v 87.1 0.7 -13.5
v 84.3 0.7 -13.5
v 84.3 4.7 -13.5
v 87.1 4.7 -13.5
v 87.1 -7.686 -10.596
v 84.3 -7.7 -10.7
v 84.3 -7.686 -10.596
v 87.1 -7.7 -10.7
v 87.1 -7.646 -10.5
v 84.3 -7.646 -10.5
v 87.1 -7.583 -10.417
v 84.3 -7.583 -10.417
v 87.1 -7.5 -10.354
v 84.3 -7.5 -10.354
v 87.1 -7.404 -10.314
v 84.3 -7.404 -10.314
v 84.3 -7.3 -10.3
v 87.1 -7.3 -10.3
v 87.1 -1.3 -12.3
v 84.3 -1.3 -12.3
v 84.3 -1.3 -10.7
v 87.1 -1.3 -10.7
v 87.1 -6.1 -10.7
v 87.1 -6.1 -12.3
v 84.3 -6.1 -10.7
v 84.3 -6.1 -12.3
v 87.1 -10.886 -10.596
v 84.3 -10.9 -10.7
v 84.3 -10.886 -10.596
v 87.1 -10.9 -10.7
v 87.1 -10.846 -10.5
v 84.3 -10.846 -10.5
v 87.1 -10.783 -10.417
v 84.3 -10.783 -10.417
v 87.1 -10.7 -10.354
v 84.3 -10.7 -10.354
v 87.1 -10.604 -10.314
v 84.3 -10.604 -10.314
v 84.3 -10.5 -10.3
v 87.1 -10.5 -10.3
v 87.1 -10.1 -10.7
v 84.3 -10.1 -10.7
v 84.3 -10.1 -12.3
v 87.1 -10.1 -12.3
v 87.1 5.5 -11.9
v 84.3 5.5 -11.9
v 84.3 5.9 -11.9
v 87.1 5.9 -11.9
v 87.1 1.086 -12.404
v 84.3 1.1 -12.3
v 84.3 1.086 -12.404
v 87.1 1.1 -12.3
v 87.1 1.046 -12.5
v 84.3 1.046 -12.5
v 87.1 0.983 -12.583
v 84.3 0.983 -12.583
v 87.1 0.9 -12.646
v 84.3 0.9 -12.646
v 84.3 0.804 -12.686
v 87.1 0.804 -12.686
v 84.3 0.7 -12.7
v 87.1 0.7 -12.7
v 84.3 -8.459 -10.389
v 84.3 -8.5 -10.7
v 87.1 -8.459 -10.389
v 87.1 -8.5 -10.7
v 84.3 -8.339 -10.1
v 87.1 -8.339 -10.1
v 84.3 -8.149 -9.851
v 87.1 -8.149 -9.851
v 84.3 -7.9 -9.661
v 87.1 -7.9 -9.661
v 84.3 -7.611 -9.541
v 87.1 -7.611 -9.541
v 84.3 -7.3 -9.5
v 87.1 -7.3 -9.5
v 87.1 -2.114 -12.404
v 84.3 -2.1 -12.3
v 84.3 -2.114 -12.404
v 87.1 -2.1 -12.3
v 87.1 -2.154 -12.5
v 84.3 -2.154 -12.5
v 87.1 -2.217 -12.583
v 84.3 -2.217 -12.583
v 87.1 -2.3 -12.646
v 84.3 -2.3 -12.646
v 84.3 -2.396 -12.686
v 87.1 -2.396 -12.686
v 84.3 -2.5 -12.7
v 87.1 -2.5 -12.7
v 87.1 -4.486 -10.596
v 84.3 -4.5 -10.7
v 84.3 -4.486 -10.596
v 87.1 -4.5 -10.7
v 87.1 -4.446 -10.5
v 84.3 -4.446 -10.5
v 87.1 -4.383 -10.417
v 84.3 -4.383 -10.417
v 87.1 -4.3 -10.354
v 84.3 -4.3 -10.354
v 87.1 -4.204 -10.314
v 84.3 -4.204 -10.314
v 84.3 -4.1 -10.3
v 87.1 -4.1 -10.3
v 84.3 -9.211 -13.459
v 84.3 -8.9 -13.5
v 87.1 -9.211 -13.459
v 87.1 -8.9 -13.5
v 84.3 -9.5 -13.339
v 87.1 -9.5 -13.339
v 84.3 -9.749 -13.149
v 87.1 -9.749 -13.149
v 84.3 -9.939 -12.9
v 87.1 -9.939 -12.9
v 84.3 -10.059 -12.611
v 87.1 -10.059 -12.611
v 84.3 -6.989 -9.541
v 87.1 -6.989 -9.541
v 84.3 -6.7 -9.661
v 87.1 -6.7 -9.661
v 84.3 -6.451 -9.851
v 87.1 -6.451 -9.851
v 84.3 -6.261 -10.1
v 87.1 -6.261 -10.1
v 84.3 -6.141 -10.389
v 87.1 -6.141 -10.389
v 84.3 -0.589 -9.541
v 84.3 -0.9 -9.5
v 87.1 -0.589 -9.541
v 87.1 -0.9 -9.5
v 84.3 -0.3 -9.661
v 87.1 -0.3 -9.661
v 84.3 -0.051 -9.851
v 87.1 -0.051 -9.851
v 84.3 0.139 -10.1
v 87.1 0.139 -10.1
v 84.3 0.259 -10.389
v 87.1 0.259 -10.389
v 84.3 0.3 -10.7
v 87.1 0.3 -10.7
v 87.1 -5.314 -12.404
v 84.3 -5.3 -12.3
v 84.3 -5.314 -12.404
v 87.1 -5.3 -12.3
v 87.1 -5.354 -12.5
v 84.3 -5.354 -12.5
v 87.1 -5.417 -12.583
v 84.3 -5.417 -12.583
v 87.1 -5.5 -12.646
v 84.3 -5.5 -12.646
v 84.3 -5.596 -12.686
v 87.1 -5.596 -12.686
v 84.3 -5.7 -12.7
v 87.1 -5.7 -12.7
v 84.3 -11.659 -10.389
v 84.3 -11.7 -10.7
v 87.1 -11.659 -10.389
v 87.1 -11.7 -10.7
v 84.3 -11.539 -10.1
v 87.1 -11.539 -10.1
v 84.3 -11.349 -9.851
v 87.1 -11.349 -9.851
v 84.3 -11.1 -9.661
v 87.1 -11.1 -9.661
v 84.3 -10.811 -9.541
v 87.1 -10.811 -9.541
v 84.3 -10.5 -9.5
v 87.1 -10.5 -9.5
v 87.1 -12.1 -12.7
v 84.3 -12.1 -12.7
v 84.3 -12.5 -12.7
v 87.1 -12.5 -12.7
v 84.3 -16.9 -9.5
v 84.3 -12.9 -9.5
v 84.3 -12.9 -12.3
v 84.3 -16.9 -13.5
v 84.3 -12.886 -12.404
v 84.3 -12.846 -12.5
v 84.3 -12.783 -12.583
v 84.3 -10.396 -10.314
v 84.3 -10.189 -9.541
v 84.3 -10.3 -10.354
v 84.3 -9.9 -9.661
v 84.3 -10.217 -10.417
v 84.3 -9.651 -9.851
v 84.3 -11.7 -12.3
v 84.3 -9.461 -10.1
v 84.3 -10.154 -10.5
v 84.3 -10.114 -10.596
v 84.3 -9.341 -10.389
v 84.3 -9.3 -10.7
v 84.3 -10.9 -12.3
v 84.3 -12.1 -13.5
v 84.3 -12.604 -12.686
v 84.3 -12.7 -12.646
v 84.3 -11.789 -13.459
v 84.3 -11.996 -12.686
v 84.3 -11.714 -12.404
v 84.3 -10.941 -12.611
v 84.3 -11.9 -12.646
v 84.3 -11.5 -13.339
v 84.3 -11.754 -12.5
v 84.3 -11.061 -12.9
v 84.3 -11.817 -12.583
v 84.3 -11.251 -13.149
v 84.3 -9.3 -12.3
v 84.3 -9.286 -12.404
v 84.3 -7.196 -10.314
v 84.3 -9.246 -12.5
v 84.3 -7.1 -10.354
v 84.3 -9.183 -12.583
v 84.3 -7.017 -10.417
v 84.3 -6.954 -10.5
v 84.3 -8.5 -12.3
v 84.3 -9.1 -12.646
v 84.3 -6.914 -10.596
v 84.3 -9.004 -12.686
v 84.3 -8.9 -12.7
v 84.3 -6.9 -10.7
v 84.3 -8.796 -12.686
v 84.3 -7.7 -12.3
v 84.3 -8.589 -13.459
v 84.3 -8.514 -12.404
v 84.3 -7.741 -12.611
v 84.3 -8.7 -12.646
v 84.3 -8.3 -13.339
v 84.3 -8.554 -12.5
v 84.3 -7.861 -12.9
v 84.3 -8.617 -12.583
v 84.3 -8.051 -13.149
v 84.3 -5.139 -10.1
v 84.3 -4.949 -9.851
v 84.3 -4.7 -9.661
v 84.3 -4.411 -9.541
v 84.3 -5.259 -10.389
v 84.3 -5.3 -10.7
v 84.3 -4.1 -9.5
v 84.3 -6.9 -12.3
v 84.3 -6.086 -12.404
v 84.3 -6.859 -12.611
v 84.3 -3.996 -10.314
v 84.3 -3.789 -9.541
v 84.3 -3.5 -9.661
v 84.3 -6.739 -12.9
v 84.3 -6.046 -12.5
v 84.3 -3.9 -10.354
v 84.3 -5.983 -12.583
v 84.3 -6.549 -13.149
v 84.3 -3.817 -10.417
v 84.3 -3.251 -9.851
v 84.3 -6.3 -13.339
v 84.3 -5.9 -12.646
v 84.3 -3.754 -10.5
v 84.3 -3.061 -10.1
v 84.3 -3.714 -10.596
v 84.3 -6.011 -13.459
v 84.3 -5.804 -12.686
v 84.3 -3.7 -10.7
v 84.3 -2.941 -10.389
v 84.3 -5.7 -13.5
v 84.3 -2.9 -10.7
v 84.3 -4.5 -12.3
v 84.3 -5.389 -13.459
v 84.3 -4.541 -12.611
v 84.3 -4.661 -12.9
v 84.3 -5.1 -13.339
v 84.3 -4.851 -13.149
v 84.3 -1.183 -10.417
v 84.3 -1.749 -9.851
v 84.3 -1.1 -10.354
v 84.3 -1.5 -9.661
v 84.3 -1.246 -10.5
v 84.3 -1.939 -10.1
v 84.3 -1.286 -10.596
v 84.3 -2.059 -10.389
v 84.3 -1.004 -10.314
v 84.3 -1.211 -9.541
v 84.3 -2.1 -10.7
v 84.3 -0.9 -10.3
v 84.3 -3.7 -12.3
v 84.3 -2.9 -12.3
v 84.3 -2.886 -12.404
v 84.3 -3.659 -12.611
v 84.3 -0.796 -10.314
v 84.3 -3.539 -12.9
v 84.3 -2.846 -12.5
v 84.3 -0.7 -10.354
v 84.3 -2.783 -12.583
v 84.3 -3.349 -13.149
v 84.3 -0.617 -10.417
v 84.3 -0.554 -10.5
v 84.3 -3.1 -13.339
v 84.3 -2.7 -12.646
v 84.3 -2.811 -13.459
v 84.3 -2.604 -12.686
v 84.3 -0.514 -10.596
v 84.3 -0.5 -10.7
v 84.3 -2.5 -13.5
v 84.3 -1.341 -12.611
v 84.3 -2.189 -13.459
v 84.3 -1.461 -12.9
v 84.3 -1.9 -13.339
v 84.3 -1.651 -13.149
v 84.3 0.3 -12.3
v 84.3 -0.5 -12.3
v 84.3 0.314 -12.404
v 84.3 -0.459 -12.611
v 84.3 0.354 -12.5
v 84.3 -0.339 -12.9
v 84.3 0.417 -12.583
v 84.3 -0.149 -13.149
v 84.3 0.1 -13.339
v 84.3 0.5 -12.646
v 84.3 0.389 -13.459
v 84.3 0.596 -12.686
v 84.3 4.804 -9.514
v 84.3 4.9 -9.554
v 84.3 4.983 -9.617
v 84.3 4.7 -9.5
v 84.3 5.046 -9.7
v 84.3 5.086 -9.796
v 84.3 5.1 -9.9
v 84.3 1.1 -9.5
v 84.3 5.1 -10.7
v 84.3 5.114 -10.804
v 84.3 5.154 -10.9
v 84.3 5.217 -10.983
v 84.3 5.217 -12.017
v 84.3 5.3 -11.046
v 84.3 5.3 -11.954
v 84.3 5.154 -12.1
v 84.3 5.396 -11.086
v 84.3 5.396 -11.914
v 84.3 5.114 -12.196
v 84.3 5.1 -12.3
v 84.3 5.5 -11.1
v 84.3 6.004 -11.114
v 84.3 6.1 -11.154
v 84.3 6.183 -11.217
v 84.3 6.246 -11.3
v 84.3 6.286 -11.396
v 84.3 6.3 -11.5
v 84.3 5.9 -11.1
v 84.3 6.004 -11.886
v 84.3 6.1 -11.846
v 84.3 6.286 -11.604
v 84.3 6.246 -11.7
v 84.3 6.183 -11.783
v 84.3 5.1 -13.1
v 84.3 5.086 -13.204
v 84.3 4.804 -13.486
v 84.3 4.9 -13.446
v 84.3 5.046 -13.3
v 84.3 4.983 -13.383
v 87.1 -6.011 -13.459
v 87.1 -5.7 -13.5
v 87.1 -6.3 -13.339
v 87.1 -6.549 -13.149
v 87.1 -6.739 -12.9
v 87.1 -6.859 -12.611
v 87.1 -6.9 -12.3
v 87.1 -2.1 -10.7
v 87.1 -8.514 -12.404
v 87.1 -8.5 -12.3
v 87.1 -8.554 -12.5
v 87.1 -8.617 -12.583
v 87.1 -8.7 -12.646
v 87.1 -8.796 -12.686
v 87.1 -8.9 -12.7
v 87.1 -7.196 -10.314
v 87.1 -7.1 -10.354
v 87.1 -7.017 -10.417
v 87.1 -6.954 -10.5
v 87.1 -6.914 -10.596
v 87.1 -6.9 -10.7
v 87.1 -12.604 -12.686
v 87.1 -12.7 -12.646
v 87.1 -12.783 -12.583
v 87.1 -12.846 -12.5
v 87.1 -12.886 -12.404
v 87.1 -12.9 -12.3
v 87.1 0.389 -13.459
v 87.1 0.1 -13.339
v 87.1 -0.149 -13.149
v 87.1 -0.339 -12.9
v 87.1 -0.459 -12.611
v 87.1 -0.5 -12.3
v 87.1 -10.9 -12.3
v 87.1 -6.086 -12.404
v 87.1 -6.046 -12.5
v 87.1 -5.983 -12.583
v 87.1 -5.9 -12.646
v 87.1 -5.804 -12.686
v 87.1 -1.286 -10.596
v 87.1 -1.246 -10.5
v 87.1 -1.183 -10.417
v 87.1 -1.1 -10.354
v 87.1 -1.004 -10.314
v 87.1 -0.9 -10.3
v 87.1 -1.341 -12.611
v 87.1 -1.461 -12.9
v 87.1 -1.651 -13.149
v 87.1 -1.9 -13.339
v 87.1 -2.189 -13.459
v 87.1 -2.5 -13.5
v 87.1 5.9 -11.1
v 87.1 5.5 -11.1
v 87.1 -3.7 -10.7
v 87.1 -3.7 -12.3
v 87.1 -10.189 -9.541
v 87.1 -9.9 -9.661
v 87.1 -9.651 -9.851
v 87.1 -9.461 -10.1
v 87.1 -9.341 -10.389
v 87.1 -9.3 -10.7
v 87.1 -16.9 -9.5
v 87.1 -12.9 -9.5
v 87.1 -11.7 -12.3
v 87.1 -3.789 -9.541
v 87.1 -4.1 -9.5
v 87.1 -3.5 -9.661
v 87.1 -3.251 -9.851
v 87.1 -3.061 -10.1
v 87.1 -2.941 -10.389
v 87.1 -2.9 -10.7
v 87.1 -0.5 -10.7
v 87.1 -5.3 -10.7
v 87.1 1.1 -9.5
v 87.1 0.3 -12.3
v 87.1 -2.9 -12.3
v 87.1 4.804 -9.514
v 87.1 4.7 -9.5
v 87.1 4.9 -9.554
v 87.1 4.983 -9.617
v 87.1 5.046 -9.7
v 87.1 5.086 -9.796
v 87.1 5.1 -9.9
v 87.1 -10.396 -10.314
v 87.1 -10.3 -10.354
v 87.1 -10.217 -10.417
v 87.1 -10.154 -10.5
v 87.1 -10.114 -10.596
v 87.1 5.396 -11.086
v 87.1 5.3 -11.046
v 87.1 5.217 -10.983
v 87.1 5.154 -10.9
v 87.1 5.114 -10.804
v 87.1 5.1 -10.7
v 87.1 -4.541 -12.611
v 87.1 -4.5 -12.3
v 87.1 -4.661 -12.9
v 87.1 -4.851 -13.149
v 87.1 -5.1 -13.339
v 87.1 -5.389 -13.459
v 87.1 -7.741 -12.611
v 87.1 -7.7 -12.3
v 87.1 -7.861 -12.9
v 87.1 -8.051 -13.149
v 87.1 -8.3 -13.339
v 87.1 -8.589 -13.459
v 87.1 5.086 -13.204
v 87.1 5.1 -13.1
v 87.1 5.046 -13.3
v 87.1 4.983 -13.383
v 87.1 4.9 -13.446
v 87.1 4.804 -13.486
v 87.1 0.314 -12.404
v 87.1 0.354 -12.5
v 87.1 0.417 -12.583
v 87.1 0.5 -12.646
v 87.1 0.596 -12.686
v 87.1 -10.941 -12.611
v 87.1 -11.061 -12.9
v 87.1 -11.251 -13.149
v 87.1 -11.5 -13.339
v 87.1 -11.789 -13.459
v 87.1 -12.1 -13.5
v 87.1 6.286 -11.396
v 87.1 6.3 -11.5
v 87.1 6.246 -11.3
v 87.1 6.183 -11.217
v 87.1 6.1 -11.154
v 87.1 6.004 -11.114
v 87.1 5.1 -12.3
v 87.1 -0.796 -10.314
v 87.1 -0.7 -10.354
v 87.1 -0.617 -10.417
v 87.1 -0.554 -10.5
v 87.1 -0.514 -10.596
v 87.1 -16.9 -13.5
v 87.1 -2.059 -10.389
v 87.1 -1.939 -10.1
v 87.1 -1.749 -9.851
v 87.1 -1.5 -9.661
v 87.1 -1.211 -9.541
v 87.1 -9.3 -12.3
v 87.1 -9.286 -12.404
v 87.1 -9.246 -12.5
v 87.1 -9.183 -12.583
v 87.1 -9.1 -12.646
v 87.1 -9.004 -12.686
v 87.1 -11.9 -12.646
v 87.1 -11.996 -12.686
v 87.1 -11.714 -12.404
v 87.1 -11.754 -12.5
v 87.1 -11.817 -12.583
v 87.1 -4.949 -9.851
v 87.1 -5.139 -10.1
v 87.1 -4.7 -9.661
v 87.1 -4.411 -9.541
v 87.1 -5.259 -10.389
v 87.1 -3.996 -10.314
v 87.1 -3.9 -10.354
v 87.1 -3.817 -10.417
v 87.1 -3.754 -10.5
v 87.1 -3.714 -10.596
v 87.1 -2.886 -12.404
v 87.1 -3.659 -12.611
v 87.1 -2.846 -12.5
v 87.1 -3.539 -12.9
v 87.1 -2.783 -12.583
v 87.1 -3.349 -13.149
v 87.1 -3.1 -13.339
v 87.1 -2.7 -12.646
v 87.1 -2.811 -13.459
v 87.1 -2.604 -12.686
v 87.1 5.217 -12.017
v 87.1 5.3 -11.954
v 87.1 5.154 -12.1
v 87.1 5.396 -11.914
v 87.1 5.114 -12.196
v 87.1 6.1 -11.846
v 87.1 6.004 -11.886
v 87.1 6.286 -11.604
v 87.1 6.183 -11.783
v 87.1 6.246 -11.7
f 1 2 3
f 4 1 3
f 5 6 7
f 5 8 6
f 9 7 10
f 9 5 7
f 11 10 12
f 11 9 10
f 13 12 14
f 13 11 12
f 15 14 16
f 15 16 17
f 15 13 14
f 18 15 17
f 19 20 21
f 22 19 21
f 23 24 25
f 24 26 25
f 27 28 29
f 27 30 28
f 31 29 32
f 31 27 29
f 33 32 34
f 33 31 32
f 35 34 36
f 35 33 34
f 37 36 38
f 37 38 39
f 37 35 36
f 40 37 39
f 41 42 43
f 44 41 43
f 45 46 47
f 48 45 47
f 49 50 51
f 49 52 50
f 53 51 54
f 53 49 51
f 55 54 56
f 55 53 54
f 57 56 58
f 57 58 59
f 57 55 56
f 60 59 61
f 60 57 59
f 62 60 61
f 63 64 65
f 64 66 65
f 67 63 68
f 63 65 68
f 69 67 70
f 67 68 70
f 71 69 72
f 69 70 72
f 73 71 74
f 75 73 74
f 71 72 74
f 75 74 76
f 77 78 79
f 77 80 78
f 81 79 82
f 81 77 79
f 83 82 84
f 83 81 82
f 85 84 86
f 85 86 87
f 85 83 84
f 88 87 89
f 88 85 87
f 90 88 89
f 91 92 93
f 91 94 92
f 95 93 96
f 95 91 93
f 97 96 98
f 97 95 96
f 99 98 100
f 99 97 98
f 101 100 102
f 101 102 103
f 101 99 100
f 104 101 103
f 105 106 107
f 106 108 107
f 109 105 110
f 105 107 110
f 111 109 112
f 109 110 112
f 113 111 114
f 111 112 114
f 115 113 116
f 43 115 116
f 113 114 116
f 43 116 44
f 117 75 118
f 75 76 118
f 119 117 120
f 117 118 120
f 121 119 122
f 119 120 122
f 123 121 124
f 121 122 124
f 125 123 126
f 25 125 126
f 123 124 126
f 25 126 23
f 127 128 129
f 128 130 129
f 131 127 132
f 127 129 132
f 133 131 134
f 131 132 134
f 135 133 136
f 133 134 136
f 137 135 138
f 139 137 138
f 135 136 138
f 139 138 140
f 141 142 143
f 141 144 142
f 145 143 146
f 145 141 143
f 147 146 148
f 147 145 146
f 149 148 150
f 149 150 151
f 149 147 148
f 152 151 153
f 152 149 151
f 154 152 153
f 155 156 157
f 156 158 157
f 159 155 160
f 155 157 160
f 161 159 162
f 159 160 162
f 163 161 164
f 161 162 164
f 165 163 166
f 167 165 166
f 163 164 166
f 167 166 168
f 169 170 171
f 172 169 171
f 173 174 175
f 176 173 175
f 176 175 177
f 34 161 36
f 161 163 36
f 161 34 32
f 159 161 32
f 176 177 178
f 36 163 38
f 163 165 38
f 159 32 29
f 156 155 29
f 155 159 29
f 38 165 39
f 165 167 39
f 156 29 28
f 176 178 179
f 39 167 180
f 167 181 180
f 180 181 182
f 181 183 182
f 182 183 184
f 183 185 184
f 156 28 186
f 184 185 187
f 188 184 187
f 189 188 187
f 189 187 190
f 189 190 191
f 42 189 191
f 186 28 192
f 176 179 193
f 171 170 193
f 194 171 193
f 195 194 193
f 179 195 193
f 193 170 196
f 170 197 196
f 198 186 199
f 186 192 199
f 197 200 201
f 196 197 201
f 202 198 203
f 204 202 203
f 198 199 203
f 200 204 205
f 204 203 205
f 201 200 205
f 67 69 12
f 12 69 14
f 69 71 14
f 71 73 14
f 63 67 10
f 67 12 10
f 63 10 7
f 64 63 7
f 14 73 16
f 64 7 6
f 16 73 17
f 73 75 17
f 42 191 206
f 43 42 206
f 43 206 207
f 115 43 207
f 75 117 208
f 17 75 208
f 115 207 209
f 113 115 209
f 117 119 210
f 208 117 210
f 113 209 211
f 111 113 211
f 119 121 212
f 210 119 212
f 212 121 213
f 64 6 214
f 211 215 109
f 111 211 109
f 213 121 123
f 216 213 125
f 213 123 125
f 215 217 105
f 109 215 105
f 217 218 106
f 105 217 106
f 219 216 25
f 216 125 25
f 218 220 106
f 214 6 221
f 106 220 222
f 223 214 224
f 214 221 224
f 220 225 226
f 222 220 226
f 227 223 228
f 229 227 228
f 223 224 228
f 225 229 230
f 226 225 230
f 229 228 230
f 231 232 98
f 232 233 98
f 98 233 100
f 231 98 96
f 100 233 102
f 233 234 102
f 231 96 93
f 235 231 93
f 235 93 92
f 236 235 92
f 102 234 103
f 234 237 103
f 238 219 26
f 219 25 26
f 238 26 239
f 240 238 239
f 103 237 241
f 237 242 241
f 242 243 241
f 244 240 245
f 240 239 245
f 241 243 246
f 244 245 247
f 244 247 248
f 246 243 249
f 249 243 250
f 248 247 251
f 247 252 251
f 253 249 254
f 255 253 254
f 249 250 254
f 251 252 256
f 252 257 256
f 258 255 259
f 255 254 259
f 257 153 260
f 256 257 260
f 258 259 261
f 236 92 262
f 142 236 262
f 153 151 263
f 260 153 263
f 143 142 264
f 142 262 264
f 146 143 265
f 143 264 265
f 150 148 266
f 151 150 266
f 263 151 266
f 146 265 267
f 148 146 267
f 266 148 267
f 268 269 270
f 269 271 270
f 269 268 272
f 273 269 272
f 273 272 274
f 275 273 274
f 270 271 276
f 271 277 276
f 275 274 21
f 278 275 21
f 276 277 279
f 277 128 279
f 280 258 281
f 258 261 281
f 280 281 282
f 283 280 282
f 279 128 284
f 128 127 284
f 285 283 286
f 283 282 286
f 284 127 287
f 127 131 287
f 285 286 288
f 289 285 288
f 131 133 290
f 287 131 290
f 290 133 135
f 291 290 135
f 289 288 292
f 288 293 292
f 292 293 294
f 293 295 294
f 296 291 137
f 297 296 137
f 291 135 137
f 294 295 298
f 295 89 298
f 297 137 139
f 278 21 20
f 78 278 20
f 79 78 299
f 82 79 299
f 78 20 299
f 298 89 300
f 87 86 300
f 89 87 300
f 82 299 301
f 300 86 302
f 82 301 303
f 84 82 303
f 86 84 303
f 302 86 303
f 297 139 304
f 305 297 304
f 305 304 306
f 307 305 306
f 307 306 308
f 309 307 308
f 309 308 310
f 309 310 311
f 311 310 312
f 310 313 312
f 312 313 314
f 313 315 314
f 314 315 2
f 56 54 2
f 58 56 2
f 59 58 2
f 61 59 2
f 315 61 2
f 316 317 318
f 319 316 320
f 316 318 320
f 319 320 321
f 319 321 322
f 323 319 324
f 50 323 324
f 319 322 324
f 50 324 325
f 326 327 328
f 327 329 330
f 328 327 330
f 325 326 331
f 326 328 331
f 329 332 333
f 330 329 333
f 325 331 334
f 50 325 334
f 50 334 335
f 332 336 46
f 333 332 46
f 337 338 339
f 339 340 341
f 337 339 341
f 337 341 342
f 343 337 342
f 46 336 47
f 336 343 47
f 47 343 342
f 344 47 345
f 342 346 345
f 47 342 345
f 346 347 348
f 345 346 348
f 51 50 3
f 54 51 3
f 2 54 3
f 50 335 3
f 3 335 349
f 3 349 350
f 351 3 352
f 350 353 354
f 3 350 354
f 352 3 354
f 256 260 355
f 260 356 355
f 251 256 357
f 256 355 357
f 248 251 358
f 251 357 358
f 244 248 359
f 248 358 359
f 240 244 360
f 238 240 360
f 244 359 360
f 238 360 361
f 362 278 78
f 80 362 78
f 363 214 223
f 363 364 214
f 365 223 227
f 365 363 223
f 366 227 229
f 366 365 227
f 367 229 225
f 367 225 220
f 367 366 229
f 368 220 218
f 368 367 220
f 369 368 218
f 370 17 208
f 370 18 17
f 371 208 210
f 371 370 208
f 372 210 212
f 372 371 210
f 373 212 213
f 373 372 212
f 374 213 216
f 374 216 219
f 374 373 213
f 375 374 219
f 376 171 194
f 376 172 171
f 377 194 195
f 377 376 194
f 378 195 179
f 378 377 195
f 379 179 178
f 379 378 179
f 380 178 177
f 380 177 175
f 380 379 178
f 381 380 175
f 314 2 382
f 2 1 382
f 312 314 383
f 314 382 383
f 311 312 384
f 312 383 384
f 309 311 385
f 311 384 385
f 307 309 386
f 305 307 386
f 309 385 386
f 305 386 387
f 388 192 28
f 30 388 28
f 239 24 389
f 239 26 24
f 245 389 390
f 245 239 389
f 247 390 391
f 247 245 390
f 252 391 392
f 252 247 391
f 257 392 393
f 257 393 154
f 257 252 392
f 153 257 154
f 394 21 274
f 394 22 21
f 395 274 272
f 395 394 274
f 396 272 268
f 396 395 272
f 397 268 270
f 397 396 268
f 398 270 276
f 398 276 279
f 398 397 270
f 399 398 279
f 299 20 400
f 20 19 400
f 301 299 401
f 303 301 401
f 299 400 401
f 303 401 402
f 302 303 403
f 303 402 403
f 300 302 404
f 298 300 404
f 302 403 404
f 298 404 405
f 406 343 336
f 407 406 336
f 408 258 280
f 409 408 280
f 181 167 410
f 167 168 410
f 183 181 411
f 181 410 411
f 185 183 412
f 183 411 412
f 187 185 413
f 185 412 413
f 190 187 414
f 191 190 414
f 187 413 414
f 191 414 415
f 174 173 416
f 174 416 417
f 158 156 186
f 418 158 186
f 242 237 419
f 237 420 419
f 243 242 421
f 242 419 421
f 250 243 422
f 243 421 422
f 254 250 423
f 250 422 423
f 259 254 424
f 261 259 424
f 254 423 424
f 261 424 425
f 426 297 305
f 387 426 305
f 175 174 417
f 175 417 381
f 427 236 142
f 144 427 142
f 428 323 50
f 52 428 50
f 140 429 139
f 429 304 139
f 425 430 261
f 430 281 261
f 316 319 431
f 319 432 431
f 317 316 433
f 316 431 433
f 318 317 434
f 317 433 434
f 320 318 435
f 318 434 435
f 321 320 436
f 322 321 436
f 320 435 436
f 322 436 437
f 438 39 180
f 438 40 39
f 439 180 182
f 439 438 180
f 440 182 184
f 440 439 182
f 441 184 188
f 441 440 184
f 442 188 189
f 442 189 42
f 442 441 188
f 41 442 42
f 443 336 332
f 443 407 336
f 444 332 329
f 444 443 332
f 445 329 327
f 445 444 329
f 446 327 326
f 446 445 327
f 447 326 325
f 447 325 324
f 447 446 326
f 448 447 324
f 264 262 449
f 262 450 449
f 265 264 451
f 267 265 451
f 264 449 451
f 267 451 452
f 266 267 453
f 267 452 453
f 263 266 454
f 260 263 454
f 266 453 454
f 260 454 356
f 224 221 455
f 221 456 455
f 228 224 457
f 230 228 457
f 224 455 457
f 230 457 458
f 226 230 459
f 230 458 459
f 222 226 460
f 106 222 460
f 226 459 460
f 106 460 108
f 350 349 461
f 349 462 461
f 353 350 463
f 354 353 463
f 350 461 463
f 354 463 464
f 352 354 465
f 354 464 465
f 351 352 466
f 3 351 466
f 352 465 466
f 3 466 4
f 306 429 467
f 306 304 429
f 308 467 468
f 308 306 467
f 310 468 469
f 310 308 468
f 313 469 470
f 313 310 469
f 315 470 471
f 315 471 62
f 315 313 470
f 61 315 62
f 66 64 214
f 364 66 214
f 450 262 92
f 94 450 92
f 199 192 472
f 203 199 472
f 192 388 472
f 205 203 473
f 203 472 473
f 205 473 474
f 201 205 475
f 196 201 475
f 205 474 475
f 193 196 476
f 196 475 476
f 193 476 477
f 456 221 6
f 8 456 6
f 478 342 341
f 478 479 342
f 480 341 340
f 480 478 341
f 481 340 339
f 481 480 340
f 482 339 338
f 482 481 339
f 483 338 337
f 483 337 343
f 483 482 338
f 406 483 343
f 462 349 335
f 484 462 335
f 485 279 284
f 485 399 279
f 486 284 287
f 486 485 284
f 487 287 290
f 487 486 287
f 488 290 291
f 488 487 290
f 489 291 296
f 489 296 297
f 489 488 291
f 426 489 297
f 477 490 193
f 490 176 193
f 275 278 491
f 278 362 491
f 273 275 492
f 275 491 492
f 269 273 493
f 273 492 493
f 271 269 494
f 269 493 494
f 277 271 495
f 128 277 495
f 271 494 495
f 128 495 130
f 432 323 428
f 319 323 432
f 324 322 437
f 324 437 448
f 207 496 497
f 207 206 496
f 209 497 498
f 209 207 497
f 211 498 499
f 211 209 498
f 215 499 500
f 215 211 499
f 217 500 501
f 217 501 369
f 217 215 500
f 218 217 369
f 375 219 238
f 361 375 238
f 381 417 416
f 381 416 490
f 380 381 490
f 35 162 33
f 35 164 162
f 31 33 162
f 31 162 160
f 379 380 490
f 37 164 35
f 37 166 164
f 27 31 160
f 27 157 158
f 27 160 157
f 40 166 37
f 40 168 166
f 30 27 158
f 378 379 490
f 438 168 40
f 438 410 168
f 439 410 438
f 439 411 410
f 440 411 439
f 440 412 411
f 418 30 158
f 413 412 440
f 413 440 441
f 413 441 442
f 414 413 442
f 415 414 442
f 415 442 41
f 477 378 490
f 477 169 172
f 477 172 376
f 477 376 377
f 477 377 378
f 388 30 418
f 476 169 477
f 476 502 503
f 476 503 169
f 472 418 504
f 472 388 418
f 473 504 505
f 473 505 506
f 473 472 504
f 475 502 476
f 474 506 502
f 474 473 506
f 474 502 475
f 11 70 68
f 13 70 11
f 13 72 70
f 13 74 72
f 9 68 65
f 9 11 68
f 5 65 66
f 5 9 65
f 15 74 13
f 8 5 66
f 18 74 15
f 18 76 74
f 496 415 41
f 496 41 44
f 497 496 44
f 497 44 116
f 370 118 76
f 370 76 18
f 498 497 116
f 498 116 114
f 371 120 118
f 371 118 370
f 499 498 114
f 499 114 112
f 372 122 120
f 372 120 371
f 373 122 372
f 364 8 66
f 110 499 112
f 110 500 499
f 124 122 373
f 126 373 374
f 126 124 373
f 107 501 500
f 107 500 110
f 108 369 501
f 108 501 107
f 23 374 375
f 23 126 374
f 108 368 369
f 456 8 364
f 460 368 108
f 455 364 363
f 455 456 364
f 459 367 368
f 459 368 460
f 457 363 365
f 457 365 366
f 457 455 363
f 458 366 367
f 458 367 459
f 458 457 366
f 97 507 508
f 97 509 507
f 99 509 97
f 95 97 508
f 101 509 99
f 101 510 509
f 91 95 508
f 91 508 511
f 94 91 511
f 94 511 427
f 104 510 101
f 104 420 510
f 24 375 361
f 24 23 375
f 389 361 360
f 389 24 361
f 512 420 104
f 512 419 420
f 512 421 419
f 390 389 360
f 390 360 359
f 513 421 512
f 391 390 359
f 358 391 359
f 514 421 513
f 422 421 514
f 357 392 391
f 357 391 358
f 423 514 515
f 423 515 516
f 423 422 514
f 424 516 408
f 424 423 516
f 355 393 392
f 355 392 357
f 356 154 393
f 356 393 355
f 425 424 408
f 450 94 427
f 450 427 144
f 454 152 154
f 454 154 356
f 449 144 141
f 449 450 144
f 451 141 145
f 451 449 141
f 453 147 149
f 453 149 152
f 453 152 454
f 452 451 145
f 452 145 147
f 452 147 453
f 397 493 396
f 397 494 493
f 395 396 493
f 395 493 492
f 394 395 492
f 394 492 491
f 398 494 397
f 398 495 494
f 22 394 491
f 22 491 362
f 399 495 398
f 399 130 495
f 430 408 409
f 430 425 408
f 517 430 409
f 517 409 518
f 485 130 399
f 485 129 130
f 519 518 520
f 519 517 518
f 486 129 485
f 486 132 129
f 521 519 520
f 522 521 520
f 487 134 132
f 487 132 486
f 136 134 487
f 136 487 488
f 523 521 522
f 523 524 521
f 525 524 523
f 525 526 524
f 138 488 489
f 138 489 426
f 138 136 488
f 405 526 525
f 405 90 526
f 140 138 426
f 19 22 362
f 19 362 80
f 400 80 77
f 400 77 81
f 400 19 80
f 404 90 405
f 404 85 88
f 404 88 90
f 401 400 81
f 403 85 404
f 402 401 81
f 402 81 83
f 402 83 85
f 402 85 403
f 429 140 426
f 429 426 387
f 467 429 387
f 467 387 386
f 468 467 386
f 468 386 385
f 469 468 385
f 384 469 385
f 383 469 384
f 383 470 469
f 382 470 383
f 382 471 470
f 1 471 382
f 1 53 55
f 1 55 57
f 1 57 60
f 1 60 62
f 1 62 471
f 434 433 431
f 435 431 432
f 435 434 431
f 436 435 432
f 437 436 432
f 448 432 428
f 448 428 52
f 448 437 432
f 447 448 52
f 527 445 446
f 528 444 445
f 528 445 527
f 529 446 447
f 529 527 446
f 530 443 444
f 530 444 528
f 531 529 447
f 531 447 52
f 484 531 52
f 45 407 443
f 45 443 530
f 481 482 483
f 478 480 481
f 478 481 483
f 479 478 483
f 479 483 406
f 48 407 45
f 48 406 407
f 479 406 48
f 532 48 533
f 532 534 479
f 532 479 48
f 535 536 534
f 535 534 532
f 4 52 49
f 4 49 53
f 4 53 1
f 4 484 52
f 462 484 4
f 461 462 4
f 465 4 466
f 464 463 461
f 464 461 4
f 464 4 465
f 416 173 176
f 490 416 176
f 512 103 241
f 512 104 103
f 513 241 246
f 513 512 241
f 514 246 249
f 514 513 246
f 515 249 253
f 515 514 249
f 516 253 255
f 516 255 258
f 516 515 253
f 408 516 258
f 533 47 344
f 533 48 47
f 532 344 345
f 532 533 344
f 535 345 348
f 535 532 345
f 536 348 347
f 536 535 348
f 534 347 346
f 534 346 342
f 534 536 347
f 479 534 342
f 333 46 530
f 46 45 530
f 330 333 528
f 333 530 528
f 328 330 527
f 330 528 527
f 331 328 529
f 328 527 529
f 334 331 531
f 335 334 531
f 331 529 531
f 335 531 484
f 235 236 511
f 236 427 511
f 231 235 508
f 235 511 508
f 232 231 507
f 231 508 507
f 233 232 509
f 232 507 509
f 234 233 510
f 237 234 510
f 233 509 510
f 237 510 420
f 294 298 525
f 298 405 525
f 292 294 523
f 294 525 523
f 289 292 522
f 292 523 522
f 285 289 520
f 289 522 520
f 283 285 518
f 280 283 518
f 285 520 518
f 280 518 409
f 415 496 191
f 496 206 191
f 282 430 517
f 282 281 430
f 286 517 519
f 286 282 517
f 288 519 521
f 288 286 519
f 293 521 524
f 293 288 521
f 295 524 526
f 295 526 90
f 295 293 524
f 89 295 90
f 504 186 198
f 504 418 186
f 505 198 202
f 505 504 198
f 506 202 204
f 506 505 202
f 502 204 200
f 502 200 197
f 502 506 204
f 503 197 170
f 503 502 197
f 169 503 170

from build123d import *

# Parameters (mm, degrees)
AUFSATZ_LINEAR_AUSTRAGEN3_DEPTH = 2.8
VERRUNDUNG2_R                   = 0.4
VERRUNDUNG5_R                   = 1.2
VERRUNDUNG6_R                   = 1.2
LINEARES_MUSTER1_COUNT          = 5
LINEARES_MUSTER1_PITCH          = 3.2
SKIZZE5_W                       = 4
SKIZZE5_H                       = 4
AUFSATZ_LINEAR_AUSTRAGEN4_DEPTH = 2.8
VERRUNDUNG3_R                   = 0.4
VERRUNDUNG4_R                   = 0.4
VERRUNDUNG8_R                   = 1.2


# Read off the part's stored shape, not the designer's step: Aufsatz-Linear austragen3
with BuildPart() as part:
    # Aufsatz-Linear austragen3 outline → Aufsatz-Linear austragen3 (new body)
    with BuildSketch(Plane(origin=(84.3, 0, 0), x_dir=(0, 0, -1), z_dir=(1, 0, 0))):
        Polygon((11.9, 5.1), (11.9, 6.3), (11.1, 6.3), (11.1, 4.3), (12.7, 4.3), (12.7, 3.5), (9.5, 3.5), (9.5, 1.1), (12.7, 1.1), (12.7, -0.1), (13.5, -0.1), (13.5, 1.9), (10.3, 1.9), (10.3, 2.7), (13.5, 2.7), (13.5, 5.1), align=None)
    extrude(amount=AUFSATZ_LINEAR_AUSTRAGEN3_DEPTH)

    # Verrundung2
    verrundung2_edges = [part.edges().sort_by_distance(p)[0] for p in [
        (85.7, 1.9, -10.3),
        (85.7, 2.7, -10.3),
        (85.7, 3.5, -12.7),
        (85.7, 4.3, -12.7),
        (85.7, 5.1, -11.9),
        (85.7, 6.3, -11.1),
        (85.7, 6.3, -11.9),
        (85.7, 1.1, -12.7),
    ]]
    fillet(verrundung2_edges, radius=VERRUNDUNG2_R - 0.0001)  # a hair under: the kernel refuses the full size


with BuildPart() as body_2:
    # Abspalten1: the piece on the far side of the plane
    add(part.part)
    split(bisect_by=Plane.ZX.offset(3.5), keep=Keep.BOTTOM)

    # Verrundung5
    verrundung5_edges = [body_2.edges().sort_by_distance(p)[0] for p in [
        (85.7, 1.1, -9.5),
        (85.7, 3.5, -9.5),
    ]]
    fillet(verrundung5_edges, radius=VERRUNDUNG5_R - 0.0001)  # a hair under: the kernel refuses the full size


with BuildPart() as part_1:
    add(part.part)

    # Abspalten1
    split(bisect_by=Plane.ZX.offset(3.5), keep=Keep.TOP)

    # Verrundung6
    verrundung6_edges = [part_1.edges().sort_by_distance(p)[0] for p in [
        (85.7, 5.1, -13.5),
    ]]
    fillet(verrundung6_edges, radius=VERRUNDUNG6_R)


with BuildPart() as lineares_muster1_1:
    # Lineares Muster1: pattern copy
    add(body_2.part.moved(Location(Vector(0, -1, 0) * (1 * LINEARES_MUSTER1_PITCH))))


with BuildPart() as lineares_muster1_2:
    # Lineares Muster1: pattern copy
    add(body_2.part.moved(Location(Vector(0, -1, 0) * (2 * LINEARES_MUSTER1_PITCH))))


with BuildPart() as lineares_muster1_3:
    # Lineares Muster1: pattern copy
    add(body_2.part.moved(Location(Vector(0, -1, 0) * (3 * LINEARES_MUSTER1_PITCH))))


with BuildPart() as lineares_muster1_4:
    # Lineares Muster1: pattern copy
    add(body_2.part.moved(Location(Vector(0, -1, 0) * (4 * LINEARES_MUSTER1_PITCH))))

    # Skizze5 → Aufsatz-Linear austragen4 (add)
    with BuildSketch(Plane(origin=(84.3, 0, 0), x_dir=(0, 0, -1), z_dir=(1, 0, 0))):
        with Locations((11.5, -14.9)):
            Rectangle(SKIZZE5_W, SKIZZE5_H)
        with Locations((11.5, 3.1)):
            Rectangle(SKIZZE5_W, SKIZZE5_H)
    extrude(amount=AUFSATZ_LINEAR_AUSTRAGEN4_DEPTH)


with BuildPart() as aufsatz_linear_austragen4_piece_1:
    # of the separate pieces the step leaves, piece 1, a body of its own (aufsatz_linear_austragen4_pieces)
    add(lineares_muster1_4.part.solids().sort_by_distance((84.3, -9.3, -10.6999))[0])

    # Verrundung3
    verrundung3_edges = [aufsatz_linear_austragen4_piece_1.edges().sort_by_distance(p)[0] for p in [
        (85.7, -12.9, -12.7),
    ]]
    fillet(verrundung3_edges, radius=VERRUNDUNG3_R)


with BuildPart() as aufsatz_linear_austragen4_piece_2:
    # of the separate pieces the step leaves, piece 2, a body of its own (aufsatz_linear_austragen4_pieces)
    add(lineares_muster1_4.part.solids().sort_by_distance((84.3, 1.1, -9.5))[0])


with BuildPart() as part_2:
    add(part_1.part)

    # Kombinieren1: union body 2, Lineares Muster1_1, Lineares Muster1_2, Lineares Muster1_3, Aufsatz-Linear austragen4 piece 1, Aufsatz-Linear austragen4 piece 2
    add(body_2.part)
    add(lineares_muster1_1.part)
    add(lineares_muster1_2.part)
    add(lineares_muster1_3.part)
    add(aufsatz_linear_austragen4_piece_1.part)
    add(aufsatz_linear_austragen4_piece_2.part)

    # Verrundung4
    verrundung4_edges = [part_2.edges().sort_by_distance(p)[0] for p in [
        (85.7, 5.1, -11.1),
        (85.7, 5.1, -13.5),
        (85.7, 0.3, -12.7),
        (85.7, -2.9, -12.7),
        (85.7, -6.1, -12.7),
        (85.7, -9.3, -12.7),
        (85.7, 5.1, -9.5),
    ]]
    fillet(verrundung4_edges, radius=VERRUNDUNG4_R)

    # Verrundung8
    verrundung8_edges = [part_2.edges().sort_by_distance(p)[0] for p in [
        (85.7, -0.5, -13.5),
        (85.7, -3.7, -13.5),
        (85.7, -1.3, -13.5),
        (85.7, -6.9, -13.5),
        (85.7, -4.5, -13.5),
        (85.7, -10.1, -13.5),
        (85.7, -7.7, -13.5),
        (85.7, -10.9, -13.5),
    ]]
    fillet(verrundung8_edges, radius=VERRUNDUNG8_R - 0.0001)  # a hair under: the kernel refuses the full size


solid = part_2.part
